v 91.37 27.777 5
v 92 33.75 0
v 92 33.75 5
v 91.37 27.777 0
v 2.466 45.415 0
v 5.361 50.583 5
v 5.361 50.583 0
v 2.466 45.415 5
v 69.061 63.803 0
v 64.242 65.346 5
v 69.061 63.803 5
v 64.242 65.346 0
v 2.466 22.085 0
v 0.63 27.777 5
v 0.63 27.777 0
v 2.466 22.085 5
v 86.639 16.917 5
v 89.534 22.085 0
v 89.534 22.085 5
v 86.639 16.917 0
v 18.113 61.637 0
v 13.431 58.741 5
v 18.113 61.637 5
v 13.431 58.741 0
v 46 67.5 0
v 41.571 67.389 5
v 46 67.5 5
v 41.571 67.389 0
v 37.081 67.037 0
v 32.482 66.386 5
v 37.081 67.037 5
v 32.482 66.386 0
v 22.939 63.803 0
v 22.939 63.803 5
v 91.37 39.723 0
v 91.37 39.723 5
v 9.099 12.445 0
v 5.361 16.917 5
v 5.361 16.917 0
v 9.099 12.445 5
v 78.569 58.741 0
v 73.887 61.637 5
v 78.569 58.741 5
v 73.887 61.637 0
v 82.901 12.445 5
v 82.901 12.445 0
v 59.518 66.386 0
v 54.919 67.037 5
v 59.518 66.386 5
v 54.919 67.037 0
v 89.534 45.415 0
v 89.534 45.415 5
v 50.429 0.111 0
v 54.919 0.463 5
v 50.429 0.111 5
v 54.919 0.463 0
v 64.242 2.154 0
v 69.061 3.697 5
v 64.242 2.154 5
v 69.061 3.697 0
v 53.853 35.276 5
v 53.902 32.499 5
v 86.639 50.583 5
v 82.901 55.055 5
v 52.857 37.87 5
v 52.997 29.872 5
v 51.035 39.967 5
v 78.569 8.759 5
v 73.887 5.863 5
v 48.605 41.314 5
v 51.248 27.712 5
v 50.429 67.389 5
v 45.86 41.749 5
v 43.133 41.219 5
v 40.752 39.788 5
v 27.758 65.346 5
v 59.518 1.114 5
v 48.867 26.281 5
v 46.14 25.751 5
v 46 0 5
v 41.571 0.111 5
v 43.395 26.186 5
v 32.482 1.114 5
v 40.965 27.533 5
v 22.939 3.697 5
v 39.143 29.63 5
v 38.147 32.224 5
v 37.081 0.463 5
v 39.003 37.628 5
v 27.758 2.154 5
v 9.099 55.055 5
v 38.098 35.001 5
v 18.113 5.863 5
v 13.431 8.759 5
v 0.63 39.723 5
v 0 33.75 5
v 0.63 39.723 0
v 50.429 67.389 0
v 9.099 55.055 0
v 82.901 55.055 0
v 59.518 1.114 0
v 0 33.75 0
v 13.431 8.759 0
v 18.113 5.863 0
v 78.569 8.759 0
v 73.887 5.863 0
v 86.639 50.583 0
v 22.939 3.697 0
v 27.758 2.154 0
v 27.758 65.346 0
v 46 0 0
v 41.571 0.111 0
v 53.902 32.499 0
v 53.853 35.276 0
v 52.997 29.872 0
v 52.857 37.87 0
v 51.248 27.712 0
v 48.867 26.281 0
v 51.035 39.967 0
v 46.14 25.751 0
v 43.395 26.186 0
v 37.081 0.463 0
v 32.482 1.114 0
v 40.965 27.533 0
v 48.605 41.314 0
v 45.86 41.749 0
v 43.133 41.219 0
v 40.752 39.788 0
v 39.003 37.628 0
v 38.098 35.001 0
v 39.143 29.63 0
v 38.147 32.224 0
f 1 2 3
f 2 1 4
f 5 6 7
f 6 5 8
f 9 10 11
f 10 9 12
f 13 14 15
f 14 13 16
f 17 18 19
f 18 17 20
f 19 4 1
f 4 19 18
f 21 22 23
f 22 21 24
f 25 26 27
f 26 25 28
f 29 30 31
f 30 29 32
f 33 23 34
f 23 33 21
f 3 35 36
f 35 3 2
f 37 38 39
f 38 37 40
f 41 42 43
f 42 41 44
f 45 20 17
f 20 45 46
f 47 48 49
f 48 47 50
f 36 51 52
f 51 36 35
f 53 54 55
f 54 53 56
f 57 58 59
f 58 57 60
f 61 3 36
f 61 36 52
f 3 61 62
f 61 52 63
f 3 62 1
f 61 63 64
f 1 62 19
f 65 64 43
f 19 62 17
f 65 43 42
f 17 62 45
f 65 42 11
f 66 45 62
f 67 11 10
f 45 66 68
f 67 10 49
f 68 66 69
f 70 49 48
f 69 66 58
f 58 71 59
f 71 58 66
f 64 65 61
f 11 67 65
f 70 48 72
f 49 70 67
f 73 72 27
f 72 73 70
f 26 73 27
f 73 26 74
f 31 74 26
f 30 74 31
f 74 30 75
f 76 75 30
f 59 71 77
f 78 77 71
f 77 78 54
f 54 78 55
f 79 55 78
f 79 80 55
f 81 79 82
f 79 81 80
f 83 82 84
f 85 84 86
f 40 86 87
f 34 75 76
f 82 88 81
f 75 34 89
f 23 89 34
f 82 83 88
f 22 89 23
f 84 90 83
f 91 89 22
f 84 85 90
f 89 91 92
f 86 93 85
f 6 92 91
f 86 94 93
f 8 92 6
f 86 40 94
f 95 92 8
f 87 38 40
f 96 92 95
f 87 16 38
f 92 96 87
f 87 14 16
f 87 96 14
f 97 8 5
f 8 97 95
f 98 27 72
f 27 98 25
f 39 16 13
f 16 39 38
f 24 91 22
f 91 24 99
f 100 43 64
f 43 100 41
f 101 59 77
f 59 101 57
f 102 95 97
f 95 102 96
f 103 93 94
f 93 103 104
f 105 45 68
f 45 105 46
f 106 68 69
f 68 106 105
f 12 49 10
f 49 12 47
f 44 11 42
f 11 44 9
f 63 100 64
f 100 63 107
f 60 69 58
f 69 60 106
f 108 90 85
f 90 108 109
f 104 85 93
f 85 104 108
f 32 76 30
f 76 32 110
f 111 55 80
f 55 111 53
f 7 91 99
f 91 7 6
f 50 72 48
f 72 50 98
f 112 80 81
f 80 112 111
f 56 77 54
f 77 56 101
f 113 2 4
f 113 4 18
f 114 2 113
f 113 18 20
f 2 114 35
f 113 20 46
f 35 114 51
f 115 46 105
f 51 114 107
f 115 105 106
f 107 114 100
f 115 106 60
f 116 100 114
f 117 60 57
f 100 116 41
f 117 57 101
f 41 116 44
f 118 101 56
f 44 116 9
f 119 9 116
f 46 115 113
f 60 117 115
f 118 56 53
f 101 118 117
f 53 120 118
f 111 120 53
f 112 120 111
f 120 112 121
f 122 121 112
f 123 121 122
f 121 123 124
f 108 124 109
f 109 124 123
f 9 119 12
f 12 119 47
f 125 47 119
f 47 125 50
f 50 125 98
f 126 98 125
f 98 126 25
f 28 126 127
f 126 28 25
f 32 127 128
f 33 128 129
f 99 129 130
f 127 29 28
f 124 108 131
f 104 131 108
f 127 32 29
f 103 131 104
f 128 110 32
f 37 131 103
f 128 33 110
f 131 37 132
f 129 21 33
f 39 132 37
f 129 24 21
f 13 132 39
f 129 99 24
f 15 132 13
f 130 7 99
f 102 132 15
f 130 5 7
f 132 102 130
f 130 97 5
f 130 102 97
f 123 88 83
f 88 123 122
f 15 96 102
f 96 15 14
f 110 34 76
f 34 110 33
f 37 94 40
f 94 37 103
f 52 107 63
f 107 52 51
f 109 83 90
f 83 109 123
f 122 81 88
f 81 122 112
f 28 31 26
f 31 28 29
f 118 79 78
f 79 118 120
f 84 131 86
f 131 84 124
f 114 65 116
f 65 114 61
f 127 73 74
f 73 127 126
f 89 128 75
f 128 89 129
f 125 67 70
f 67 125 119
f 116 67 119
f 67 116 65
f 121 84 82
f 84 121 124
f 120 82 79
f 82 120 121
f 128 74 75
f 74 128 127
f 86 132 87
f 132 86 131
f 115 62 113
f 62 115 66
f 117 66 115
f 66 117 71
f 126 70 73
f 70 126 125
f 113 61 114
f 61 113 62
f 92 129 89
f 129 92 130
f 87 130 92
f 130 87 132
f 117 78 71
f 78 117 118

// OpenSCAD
$fn = 32;

// ----------------------------------------------------------------------
// Cam plate: double_lobe cam, base R32
// ----------------------------------------------------------------------

// --- parameters (mm) ---
base_r = 32;              // base circle radius
lobe_h = 14;              // cam lobe rise
bore_r = 8;               // shaft bore radius
plate_t = 5;              // plate thickness, Z (extrusion height)

profile = [[92, 33.75], [91.37, 39.723], [89.534, 45.415], [86.639, 50.583], [82.901, 55.055], [78.569, 58.741], [73.887, 61.637], [69.061, 63.803], [64.242, 65.346], [59.518, 66.386], [54.919, 67.037], [50.429, 67.389], [46, 67.5], [41.571, 67.389], [37.081, 67.037], [32.482, 66.386], [27.758, 65.346], [22.939, 63.803], [18.113, 61.637], [13.431, 58.741], [9.099, 55.055], [5.361, 50.583], [2.466, 45.415], [0.63, 39.723], [0, 33.75], [0.63, 27.777], [2.466, 22.085], [5.361, 16.917], [9.099, 12.445], [13.431, 8.759], [18.113, 5.863], [22.939, 3.697], [27.758, 2.154], [32.482, 1.114], [37.081, 0.463], [41.571, 0.111], [46, 0], [50.429, 0.111], [54.919, 0.463], [59.518, 1.114], [64.242, 2.154], [69.061, 3.697], [73.887, 5.863], [78.569, 8.759], [82.901, 12.445], [86.639, 16.917], [89.534, 22.085], [91.37, 27.777]];  // primary outline, 48 points, counter clockwise
void_1 = [[53.853, 35.276], [52.857, 37.87], [51.035, 39.967], [48.605, 41.314], [45.86, 41.749], [43.133, 41.219], [40.752, 39.788], [39.003, 37.628], [38.098, 35.001], [38.147, 32.224], [39.143, 29.63], [40.965, 27.533], [43.395, 26.186], [46.14, 25.751], [48.867, 26.281], [51.248, 27.712], [52.997, 29.872], [53.902, 32.499]];  // shaft bore, 18 points

// --- the one profile operation ---
difference() {
  linear_extrude(height = plate_t) polygon(points = profile);
  translate([0, 0, -1])
    linear_extrude(height = plate_t + 2) polygon(points = void_1);
}
